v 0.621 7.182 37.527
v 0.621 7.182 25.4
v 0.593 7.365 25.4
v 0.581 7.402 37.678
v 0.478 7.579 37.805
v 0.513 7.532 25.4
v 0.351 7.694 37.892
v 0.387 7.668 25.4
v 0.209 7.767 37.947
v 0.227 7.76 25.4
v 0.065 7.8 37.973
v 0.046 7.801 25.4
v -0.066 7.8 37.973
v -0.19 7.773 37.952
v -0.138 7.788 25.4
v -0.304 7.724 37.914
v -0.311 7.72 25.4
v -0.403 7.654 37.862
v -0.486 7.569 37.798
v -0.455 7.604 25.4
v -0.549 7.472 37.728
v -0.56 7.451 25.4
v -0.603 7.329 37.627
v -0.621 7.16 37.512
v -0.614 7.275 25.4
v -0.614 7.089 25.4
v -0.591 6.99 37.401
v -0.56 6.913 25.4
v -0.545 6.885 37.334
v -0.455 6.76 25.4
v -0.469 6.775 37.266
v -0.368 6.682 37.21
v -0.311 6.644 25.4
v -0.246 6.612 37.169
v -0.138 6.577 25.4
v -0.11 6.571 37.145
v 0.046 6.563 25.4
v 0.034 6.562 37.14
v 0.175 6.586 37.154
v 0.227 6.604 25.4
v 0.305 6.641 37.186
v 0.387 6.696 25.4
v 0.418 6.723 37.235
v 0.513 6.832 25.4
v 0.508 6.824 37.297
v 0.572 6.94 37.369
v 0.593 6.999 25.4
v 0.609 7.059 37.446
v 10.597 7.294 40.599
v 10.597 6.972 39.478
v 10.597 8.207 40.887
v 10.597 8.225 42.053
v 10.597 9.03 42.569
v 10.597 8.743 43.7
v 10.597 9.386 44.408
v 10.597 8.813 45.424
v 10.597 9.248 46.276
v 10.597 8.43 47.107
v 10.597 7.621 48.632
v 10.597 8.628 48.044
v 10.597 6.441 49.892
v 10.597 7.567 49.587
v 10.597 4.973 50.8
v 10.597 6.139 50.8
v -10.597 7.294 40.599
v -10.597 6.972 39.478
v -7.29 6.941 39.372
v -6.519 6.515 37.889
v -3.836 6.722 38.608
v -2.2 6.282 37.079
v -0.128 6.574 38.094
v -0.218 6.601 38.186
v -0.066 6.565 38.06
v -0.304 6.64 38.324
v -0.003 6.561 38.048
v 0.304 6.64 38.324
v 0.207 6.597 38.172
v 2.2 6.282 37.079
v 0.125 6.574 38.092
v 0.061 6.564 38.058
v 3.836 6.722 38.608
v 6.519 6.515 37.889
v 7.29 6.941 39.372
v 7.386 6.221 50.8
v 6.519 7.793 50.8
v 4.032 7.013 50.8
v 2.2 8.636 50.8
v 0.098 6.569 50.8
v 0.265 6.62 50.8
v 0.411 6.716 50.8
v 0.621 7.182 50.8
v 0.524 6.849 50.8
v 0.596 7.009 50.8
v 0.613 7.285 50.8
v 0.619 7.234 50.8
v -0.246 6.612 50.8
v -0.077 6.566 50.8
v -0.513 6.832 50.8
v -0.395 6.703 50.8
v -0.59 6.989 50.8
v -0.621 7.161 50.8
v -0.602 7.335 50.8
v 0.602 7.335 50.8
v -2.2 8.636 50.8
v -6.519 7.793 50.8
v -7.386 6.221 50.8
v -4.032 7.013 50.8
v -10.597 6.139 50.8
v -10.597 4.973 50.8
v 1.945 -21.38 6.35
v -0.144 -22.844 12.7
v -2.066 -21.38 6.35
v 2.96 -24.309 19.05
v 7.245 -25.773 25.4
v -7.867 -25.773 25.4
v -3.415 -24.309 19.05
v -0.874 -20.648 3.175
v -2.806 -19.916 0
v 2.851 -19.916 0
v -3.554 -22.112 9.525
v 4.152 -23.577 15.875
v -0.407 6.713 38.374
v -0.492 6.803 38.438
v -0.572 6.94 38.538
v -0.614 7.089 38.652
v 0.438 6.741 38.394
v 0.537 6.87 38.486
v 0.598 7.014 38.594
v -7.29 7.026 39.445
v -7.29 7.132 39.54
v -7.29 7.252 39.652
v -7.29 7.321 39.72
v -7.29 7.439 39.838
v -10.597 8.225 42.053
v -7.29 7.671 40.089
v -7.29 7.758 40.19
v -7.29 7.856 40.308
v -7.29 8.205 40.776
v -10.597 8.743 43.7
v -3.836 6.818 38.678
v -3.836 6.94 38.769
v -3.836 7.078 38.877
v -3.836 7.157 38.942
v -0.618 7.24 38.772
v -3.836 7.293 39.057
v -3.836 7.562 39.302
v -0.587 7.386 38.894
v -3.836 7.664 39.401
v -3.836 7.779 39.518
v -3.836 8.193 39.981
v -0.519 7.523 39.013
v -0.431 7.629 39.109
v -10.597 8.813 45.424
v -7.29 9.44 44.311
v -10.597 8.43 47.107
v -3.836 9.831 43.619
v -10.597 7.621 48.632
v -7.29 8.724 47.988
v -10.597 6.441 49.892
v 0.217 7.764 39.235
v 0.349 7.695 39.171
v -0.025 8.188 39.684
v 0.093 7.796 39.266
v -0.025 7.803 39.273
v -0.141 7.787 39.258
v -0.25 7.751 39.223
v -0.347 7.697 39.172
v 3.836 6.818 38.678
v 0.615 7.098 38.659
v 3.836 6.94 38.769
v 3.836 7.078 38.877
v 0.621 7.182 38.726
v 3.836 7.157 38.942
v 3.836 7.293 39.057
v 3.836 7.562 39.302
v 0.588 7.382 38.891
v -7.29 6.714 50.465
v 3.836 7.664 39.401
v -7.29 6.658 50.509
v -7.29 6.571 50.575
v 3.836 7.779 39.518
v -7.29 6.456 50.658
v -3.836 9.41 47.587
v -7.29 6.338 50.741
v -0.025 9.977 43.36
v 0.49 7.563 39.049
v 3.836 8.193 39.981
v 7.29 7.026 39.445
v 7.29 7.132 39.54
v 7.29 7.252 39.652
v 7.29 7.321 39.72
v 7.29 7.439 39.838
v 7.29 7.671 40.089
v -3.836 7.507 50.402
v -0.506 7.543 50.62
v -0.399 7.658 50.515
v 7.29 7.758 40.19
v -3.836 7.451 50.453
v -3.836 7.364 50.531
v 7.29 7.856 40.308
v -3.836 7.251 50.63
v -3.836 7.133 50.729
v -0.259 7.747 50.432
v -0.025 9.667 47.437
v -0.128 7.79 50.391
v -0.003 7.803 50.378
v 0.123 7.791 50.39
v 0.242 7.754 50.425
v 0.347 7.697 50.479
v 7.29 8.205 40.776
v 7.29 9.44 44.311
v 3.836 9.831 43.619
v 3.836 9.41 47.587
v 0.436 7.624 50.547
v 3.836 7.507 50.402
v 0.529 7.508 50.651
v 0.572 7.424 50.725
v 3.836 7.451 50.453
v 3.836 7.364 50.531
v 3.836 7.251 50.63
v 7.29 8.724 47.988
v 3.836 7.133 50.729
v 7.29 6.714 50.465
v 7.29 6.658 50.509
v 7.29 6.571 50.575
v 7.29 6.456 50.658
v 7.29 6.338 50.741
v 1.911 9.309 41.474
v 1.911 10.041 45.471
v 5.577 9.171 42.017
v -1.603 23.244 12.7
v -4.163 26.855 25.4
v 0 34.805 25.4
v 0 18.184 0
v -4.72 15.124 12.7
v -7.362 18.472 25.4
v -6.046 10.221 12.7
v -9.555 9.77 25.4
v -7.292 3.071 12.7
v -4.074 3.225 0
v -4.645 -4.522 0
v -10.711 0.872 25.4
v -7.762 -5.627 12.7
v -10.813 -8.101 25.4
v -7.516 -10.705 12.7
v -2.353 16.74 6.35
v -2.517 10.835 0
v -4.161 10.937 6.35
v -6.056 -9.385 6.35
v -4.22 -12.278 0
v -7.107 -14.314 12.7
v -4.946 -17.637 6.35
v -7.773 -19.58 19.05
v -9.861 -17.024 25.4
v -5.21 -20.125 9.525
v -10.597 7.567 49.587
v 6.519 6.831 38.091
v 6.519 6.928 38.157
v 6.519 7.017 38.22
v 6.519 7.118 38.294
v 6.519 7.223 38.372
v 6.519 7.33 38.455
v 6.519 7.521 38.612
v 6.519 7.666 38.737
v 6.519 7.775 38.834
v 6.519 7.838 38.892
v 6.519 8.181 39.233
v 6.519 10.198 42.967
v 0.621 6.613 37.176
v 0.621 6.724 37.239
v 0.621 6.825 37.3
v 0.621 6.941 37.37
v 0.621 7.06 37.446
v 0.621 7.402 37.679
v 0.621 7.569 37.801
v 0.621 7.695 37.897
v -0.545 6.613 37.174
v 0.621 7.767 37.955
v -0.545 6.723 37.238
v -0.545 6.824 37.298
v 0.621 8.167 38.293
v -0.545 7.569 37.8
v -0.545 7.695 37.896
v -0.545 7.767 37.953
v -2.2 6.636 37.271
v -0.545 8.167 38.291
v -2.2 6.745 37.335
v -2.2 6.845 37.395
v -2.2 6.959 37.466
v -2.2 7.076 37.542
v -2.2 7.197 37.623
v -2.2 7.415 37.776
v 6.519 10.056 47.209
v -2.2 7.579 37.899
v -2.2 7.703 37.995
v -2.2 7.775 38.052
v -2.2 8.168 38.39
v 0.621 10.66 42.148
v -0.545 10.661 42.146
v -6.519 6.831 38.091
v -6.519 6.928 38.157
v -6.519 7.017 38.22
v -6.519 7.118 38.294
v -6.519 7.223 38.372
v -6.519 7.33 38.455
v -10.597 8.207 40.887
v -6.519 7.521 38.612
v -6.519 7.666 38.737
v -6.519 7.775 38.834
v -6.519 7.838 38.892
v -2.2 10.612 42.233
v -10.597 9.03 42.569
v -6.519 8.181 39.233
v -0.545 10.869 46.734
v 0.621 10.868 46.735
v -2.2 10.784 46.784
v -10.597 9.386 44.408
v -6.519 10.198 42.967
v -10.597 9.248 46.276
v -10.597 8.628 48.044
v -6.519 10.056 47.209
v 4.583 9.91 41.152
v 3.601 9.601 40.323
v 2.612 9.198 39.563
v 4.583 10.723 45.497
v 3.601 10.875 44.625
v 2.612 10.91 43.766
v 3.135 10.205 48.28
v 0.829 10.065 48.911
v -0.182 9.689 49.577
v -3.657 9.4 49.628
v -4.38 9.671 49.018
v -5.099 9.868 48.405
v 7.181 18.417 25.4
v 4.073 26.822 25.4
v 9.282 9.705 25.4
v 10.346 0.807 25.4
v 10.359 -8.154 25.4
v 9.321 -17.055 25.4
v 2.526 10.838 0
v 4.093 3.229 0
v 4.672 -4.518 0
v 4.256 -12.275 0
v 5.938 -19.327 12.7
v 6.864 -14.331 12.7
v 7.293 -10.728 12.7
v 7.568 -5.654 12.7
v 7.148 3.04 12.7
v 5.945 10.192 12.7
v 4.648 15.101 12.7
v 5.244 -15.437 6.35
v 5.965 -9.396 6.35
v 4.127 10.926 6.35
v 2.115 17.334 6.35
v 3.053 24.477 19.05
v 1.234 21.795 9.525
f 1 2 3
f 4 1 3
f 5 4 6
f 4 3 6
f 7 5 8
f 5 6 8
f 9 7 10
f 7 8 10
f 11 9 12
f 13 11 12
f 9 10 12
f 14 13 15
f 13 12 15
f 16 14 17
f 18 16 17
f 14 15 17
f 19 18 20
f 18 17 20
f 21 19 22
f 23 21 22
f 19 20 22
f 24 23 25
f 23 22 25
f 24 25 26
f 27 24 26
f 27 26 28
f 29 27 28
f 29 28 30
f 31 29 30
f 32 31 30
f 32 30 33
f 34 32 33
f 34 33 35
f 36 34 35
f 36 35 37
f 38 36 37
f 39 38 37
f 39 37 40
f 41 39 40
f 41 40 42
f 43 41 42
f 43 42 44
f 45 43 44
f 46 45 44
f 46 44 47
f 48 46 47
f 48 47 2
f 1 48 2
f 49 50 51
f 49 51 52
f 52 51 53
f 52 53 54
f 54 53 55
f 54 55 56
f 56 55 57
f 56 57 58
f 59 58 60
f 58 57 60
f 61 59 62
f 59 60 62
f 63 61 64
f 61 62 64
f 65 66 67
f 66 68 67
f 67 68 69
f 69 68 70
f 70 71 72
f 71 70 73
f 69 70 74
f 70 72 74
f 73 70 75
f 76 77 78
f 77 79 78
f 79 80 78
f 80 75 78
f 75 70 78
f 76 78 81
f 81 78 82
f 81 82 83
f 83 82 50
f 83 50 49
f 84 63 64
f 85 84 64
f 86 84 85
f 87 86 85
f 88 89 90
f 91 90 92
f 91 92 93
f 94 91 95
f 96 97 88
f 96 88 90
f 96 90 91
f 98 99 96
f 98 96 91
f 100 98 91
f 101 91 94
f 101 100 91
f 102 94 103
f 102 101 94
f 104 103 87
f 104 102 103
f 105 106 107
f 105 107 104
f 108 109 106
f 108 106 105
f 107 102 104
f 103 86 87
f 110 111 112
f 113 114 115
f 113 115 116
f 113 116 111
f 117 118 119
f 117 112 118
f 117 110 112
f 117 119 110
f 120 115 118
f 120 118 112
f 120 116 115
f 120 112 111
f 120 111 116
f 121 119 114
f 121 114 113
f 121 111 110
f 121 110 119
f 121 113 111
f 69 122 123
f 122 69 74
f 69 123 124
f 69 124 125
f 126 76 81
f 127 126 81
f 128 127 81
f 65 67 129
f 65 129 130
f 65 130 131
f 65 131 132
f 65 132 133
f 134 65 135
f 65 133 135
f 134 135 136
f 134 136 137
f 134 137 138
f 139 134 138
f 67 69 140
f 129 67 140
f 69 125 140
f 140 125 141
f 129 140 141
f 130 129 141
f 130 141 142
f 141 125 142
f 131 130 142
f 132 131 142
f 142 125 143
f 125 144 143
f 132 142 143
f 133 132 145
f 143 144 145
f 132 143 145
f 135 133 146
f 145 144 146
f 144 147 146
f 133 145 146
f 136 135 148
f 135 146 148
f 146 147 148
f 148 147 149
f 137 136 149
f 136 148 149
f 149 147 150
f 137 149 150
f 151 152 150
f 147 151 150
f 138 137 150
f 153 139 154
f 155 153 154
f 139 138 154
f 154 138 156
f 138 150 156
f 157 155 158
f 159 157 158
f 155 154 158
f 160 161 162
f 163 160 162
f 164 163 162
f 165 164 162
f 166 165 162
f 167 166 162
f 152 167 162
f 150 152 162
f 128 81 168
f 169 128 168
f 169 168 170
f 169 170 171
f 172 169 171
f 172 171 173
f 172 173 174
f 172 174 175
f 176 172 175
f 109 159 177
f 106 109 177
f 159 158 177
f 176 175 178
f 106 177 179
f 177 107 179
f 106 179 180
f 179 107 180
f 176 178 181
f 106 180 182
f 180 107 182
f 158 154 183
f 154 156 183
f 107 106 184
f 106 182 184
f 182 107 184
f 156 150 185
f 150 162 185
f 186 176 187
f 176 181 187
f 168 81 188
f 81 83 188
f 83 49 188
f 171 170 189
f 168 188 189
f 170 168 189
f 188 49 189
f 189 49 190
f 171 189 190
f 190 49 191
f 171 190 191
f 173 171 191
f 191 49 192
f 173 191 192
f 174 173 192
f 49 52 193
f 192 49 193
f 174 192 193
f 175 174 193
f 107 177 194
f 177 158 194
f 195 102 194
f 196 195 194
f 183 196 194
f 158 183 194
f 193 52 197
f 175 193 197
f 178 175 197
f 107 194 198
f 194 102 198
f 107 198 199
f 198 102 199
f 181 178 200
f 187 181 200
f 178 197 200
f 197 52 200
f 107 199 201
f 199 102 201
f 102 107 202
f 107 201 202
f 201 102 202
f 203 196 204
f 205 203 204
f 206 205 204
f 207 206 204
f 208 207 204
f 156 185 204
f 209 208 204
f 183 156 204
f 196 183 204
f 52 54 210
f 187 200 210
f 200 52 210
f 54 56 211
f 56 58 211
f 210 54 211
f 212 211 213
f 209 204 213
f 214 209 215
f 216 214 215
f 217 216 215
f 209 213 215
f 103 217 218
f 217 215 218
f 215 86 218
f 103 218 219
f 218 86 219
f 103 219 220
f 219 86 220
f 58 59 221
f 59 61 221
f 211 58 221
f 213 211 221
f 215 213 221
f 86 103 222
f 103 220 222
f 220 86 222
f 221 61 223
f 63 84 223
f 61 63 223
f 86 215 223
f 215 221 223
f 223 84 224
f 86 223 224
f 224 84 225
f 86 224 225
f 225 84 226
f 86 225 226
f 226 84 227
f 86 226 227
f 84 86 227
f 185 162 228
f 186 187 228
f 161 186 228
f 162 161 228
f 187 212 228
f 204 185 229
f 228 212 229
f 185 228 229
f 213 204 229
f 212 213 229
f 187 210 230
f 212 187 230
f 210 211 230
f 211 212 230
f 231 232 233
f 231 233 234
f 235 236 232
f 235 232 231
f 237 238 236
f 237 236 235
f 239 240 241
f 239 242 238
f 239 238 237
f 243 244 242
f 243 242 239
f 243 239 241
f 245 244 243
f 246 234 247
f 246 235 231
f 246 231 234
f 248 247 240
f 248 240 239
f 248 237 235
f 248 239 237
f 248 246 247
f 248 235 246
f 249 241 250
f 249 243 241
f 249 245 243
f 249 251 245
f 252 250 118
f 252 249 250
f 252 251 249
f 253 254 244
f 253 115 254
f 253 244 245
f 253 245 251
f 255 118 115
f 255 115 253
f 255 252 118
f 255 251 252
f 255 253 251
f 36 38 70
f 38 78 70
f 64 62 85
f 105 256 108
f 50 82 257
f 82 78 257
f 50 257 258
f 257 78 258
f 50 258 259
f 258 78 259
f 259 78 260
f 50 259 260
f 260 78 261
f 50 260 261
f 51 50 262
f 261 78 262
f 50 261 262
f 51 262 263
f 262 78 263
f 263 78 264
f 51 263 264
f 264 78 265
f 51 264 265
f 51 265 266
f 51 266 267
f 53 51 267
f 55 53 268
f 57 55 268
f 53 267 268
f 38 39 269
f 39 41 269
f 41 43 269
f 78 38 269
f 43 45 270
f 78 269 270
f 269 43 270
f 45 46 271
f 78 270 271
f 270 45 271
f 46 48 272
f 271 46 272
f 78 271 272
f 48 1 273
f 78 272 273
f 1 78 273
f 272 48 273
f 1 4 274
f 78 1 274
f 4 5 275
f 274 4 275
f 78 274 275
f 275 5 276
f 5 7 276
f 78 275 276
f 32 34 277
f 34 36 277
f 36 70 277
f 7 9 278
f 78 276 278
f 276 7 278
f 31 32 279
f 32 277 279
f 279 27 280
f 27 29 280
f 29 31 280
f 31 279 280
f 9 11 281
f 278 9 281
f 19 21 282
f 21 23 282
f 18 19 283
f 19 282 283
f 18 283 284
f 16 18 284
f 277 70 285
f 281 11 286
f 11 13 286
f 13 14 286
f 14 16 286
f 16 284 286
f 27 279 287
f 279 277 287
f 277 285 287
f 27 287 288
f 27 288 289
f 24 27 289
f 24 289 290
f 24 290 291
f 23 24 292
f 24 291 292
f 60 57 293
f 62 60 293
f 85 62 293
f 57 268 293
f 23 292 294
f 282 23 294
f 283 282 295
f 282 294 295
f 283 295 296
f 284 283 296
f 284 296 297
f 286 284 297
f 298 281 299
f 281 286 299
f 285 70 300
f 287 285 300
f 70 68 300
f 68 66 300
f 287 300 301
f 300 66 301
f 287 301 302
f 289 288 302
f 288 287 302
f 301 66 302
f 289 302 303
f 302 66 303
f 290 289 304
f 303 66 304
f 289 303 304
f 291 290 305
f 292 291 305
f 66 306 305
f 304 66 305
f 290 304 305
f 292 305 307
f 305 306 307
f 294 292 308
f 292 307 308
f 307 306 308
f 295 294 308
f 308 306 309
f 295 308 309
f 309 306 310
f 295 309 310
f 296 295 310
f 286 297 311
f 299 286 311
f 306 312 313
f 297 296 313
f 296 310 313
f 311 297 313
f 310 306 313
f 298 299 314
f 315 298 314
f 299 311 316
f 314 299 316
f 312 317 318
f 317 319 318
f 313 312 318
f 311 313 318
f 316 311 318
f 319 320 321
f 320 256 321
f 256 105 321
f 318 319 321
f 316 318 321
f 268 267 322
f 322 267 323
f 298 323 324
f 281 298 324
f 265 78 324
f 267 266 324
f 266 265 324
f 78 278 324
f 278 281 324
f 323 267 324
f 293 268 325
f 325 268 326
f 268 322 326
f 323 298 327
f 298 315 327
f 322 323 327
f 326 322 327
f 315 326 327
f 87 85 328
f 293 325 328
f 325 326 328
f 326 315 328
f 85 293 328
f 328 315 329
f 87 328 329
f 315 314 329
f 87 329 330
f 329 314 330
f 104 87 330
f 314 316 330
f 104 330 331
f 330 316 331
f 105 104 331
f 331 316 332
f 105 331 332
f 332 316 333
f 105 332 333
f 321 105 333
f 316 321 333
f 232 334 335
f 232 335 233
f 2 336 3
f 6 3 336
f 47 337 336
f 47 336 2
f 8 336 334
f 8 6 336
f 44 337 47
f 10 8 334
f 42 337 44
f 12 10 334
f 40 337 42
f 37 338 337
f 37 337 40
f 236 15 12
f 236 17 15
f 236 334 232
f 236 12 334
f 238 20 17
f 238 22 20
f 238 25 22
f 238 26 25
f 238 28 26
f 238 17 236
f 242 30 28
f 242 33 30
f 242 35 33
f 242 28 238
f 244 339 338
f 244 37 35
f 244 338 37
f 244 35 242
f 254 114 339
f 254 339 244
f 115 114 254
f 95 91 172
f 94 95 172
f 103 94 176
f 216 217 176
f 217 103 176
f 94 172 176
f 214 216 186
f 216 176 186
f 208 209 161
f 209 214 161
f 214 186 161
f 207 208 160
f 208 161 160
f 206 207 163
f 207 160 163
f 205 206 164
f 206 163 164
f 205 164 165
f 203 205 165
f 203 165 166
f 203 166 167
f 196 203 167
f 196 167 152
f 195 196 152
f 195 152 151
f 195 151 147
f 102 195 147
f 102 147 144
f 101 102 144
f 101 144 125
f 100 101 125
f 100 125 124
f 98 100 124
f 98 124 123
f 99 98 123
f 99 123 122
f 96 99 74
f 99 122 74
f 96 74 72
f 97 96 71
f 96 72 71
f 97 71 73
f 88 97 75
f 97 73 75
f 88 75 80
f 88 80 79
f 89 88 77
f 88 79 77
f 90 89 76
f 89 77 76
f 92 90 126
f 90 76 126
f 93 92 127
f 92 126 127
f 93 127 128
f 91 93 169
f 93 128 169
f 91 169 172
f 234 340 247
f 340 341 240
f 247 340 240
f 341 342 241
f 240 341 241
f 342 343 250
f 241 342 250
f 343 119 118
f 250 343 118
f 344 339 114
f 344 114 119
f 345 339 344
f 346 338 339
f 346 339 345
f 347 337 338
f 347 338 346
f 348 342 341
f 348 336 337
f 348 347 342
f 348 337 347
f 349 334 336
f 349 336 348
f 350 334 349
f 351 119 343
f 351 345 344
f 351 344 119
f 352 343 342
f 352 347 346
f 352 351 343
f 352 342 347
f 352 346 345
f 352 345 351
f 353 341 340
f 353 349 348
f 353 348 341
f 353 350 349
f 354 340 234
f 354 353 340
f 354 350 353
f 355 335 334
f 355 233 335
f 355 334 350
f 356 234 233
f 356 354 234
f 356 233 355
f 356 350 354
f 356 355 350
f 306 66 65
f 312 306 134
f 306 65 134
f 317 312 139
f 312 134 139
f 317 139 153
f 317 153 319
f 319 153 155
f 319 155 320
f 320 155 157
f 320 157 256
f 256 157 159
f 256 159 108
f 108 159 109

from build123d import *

# Parameters (mm, degrees)
F4_R     = 0.621052
F5_DEPTH = 25.4


with BuildPart() as f3:
    # F0 (on Top) → F3 section 0
    with BuildSketch(Plane.XY):
        with BuildLine():
            ThreePointArc((0, 18.184091), (-4.48363, -0.639026), (-2.805989, -19.915909))
            Line((-2.805989, -19.915909), (2.85146, -19.915909))
            ThreePointArc((2.85146, -19.915909), (4.506652, -0.635328), (0, 18.184091))
        make_face()
    # F2 (on offset) → F3 section 1
    with BuildSketch(Plane.XY.offset(25.4)):
        with BuildLine():
            ThreePointArc((0, 34.804691), (-10.264244, 5.338028), (-7.867152, -25.77295))
            Line((-7.867152, -25.77295), (7.245407, -25.77295))
            ThreePointArc((7.245407, -25.77295), (9.944669, 5.272011), (0, 34.804691))
        make_face()
    loft()

    # F4 (on face) → F5 (join)
    with BuildSketch(Plane.XY.offset(25.4)):
        with Locations((0, 7.182024)):
            Circle(F4_R)
    extrude(amount=F5_DEPTH)

    # F9: sweep along a path in F8
    with BuildLine(Plane.YZ) as f9_path:
        ThreePointArc((6.253172, 36.976661), (10.944831, 43.26766), (8.742062, 50.8))
    # F7 (on offset) → F9 (sweep)
    with BuildSketch(Plane.XY.offset(50.8)):
        with BuildLine():
            ThreePointArc((-10.597052, 4.972847), (0, 7.3424), (10.597052, 4.972847))
            Line((10.597052, 4.972847), (10.597052, 6.139166))
            ThreePointArc((10.597052, 6.139166), (0, 8.742062), (-10.597052, 6.139166))
            Line((-10.597052, 6.139166), (-10.597052, 4.972847))
        make_face()
    sweep(path=f9_path.line)


solid = f3.part
